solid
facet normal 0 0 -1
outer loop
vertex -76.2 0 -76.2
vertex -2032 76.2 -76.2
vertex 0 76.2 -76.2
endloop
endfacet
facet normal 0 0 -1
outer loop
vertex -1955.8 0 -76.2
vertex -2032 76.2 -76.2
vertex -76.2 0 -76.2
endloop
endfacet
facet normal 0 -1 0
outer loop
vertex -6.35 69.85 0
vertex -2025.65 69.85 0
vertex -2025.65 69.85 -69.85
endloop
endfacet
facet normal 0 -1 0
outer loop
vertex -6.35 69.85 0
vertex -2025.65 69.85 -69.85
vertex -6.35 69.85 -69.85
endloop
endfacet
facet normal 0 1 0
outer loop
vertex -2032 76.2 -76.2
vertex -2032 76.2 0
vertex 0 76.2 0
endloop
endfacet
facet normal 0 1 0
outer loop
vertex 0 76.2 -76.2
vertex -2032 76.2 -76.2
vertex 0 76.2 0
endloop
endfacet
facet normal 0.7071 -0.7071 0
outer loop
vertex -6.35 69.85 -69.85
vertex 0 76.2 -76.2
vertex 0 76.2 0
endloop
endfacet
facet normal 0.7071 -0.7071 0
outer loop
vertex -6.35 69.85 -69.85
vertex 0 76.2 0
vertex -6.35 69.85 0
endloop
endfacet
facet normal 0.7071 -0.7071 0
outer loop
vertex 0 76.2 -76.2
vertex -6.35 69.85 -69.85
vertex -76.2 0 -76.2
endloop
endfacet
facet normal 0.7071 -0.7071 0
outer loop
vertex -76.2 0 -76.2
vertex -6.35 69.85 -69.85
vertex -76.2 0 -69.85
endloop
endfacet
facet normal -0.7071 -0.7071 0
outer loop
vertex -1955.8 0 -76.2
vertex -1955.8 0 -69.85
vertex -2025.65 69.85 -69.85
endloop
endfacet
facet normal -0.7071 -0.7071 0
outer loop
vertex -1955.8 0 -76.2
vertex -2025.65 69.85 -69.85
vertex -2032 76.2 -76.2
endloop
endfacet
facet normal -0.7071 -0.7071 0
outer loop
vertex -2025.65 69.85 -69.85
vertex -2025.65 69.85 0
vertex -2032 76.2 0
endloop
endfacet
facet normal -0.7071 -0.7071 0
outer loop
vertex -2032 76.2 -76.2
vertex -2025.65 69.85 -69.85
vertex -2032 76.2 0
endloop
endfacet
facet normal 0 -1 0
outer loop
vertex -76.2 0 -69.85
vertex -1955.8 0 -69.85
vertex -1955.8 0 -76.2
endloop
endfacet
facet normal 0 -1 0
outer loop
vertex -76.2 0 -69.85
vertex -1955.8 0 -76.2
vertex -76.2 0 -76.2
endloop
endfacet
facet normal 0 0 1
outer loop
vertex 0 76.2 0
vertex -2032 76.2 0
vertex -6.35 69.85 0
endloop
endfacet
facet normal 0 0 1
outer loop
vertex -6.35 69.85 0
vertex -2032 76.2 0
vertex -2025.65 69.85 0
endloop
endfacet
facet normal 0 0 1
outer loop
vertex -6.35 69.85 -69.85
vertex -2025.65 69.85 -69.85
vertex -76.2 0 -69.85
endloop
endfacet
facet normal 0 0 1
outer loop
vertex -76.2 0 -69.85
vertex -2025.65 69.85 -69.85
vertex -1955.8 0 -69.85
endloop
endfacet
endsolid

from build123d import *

# Parameters (mm, degrees)
F0_W     = 2032
F0_H     = 76.2
F1_DEPTH = 76.2
F2_W     = 2032
F2_H     = 69.85
F3_DEPTH = 69.85
F5_DEPTH = 76.2


with BuildPart() as f1:
    # F0 (on Top) → F1 (new body)
    with BuildSketch(Plane.XY):
        with Locations((-1016, 38.1)):
            Rectangle(F0_W, F0_H)
    extrude(amount=-F1_DEPTH)

    # F2 (on face) → F3 (cut)
    with BuildSketch(Plane.XY):
        with Locations((-1016, 34.925)):
            Rectangle(F2_W, F2_H)
    extrude(amount=-F3_DEPTH, mode=Mode.SUBTRACT)

    # F4 (on face) → F5 (cut)
    with BuildSketch(Plane.XY):
        Polygon((-1955.8, 0), (-2032, 76.2), (-2032, 0), align=None)
        Polygon((0, 76.2), (-76.2, 0), (0, 0), align=None)
    extrude(amount=-F5_DEPTH, mode=Mode.SUBTRACT)


solid = f1.part
